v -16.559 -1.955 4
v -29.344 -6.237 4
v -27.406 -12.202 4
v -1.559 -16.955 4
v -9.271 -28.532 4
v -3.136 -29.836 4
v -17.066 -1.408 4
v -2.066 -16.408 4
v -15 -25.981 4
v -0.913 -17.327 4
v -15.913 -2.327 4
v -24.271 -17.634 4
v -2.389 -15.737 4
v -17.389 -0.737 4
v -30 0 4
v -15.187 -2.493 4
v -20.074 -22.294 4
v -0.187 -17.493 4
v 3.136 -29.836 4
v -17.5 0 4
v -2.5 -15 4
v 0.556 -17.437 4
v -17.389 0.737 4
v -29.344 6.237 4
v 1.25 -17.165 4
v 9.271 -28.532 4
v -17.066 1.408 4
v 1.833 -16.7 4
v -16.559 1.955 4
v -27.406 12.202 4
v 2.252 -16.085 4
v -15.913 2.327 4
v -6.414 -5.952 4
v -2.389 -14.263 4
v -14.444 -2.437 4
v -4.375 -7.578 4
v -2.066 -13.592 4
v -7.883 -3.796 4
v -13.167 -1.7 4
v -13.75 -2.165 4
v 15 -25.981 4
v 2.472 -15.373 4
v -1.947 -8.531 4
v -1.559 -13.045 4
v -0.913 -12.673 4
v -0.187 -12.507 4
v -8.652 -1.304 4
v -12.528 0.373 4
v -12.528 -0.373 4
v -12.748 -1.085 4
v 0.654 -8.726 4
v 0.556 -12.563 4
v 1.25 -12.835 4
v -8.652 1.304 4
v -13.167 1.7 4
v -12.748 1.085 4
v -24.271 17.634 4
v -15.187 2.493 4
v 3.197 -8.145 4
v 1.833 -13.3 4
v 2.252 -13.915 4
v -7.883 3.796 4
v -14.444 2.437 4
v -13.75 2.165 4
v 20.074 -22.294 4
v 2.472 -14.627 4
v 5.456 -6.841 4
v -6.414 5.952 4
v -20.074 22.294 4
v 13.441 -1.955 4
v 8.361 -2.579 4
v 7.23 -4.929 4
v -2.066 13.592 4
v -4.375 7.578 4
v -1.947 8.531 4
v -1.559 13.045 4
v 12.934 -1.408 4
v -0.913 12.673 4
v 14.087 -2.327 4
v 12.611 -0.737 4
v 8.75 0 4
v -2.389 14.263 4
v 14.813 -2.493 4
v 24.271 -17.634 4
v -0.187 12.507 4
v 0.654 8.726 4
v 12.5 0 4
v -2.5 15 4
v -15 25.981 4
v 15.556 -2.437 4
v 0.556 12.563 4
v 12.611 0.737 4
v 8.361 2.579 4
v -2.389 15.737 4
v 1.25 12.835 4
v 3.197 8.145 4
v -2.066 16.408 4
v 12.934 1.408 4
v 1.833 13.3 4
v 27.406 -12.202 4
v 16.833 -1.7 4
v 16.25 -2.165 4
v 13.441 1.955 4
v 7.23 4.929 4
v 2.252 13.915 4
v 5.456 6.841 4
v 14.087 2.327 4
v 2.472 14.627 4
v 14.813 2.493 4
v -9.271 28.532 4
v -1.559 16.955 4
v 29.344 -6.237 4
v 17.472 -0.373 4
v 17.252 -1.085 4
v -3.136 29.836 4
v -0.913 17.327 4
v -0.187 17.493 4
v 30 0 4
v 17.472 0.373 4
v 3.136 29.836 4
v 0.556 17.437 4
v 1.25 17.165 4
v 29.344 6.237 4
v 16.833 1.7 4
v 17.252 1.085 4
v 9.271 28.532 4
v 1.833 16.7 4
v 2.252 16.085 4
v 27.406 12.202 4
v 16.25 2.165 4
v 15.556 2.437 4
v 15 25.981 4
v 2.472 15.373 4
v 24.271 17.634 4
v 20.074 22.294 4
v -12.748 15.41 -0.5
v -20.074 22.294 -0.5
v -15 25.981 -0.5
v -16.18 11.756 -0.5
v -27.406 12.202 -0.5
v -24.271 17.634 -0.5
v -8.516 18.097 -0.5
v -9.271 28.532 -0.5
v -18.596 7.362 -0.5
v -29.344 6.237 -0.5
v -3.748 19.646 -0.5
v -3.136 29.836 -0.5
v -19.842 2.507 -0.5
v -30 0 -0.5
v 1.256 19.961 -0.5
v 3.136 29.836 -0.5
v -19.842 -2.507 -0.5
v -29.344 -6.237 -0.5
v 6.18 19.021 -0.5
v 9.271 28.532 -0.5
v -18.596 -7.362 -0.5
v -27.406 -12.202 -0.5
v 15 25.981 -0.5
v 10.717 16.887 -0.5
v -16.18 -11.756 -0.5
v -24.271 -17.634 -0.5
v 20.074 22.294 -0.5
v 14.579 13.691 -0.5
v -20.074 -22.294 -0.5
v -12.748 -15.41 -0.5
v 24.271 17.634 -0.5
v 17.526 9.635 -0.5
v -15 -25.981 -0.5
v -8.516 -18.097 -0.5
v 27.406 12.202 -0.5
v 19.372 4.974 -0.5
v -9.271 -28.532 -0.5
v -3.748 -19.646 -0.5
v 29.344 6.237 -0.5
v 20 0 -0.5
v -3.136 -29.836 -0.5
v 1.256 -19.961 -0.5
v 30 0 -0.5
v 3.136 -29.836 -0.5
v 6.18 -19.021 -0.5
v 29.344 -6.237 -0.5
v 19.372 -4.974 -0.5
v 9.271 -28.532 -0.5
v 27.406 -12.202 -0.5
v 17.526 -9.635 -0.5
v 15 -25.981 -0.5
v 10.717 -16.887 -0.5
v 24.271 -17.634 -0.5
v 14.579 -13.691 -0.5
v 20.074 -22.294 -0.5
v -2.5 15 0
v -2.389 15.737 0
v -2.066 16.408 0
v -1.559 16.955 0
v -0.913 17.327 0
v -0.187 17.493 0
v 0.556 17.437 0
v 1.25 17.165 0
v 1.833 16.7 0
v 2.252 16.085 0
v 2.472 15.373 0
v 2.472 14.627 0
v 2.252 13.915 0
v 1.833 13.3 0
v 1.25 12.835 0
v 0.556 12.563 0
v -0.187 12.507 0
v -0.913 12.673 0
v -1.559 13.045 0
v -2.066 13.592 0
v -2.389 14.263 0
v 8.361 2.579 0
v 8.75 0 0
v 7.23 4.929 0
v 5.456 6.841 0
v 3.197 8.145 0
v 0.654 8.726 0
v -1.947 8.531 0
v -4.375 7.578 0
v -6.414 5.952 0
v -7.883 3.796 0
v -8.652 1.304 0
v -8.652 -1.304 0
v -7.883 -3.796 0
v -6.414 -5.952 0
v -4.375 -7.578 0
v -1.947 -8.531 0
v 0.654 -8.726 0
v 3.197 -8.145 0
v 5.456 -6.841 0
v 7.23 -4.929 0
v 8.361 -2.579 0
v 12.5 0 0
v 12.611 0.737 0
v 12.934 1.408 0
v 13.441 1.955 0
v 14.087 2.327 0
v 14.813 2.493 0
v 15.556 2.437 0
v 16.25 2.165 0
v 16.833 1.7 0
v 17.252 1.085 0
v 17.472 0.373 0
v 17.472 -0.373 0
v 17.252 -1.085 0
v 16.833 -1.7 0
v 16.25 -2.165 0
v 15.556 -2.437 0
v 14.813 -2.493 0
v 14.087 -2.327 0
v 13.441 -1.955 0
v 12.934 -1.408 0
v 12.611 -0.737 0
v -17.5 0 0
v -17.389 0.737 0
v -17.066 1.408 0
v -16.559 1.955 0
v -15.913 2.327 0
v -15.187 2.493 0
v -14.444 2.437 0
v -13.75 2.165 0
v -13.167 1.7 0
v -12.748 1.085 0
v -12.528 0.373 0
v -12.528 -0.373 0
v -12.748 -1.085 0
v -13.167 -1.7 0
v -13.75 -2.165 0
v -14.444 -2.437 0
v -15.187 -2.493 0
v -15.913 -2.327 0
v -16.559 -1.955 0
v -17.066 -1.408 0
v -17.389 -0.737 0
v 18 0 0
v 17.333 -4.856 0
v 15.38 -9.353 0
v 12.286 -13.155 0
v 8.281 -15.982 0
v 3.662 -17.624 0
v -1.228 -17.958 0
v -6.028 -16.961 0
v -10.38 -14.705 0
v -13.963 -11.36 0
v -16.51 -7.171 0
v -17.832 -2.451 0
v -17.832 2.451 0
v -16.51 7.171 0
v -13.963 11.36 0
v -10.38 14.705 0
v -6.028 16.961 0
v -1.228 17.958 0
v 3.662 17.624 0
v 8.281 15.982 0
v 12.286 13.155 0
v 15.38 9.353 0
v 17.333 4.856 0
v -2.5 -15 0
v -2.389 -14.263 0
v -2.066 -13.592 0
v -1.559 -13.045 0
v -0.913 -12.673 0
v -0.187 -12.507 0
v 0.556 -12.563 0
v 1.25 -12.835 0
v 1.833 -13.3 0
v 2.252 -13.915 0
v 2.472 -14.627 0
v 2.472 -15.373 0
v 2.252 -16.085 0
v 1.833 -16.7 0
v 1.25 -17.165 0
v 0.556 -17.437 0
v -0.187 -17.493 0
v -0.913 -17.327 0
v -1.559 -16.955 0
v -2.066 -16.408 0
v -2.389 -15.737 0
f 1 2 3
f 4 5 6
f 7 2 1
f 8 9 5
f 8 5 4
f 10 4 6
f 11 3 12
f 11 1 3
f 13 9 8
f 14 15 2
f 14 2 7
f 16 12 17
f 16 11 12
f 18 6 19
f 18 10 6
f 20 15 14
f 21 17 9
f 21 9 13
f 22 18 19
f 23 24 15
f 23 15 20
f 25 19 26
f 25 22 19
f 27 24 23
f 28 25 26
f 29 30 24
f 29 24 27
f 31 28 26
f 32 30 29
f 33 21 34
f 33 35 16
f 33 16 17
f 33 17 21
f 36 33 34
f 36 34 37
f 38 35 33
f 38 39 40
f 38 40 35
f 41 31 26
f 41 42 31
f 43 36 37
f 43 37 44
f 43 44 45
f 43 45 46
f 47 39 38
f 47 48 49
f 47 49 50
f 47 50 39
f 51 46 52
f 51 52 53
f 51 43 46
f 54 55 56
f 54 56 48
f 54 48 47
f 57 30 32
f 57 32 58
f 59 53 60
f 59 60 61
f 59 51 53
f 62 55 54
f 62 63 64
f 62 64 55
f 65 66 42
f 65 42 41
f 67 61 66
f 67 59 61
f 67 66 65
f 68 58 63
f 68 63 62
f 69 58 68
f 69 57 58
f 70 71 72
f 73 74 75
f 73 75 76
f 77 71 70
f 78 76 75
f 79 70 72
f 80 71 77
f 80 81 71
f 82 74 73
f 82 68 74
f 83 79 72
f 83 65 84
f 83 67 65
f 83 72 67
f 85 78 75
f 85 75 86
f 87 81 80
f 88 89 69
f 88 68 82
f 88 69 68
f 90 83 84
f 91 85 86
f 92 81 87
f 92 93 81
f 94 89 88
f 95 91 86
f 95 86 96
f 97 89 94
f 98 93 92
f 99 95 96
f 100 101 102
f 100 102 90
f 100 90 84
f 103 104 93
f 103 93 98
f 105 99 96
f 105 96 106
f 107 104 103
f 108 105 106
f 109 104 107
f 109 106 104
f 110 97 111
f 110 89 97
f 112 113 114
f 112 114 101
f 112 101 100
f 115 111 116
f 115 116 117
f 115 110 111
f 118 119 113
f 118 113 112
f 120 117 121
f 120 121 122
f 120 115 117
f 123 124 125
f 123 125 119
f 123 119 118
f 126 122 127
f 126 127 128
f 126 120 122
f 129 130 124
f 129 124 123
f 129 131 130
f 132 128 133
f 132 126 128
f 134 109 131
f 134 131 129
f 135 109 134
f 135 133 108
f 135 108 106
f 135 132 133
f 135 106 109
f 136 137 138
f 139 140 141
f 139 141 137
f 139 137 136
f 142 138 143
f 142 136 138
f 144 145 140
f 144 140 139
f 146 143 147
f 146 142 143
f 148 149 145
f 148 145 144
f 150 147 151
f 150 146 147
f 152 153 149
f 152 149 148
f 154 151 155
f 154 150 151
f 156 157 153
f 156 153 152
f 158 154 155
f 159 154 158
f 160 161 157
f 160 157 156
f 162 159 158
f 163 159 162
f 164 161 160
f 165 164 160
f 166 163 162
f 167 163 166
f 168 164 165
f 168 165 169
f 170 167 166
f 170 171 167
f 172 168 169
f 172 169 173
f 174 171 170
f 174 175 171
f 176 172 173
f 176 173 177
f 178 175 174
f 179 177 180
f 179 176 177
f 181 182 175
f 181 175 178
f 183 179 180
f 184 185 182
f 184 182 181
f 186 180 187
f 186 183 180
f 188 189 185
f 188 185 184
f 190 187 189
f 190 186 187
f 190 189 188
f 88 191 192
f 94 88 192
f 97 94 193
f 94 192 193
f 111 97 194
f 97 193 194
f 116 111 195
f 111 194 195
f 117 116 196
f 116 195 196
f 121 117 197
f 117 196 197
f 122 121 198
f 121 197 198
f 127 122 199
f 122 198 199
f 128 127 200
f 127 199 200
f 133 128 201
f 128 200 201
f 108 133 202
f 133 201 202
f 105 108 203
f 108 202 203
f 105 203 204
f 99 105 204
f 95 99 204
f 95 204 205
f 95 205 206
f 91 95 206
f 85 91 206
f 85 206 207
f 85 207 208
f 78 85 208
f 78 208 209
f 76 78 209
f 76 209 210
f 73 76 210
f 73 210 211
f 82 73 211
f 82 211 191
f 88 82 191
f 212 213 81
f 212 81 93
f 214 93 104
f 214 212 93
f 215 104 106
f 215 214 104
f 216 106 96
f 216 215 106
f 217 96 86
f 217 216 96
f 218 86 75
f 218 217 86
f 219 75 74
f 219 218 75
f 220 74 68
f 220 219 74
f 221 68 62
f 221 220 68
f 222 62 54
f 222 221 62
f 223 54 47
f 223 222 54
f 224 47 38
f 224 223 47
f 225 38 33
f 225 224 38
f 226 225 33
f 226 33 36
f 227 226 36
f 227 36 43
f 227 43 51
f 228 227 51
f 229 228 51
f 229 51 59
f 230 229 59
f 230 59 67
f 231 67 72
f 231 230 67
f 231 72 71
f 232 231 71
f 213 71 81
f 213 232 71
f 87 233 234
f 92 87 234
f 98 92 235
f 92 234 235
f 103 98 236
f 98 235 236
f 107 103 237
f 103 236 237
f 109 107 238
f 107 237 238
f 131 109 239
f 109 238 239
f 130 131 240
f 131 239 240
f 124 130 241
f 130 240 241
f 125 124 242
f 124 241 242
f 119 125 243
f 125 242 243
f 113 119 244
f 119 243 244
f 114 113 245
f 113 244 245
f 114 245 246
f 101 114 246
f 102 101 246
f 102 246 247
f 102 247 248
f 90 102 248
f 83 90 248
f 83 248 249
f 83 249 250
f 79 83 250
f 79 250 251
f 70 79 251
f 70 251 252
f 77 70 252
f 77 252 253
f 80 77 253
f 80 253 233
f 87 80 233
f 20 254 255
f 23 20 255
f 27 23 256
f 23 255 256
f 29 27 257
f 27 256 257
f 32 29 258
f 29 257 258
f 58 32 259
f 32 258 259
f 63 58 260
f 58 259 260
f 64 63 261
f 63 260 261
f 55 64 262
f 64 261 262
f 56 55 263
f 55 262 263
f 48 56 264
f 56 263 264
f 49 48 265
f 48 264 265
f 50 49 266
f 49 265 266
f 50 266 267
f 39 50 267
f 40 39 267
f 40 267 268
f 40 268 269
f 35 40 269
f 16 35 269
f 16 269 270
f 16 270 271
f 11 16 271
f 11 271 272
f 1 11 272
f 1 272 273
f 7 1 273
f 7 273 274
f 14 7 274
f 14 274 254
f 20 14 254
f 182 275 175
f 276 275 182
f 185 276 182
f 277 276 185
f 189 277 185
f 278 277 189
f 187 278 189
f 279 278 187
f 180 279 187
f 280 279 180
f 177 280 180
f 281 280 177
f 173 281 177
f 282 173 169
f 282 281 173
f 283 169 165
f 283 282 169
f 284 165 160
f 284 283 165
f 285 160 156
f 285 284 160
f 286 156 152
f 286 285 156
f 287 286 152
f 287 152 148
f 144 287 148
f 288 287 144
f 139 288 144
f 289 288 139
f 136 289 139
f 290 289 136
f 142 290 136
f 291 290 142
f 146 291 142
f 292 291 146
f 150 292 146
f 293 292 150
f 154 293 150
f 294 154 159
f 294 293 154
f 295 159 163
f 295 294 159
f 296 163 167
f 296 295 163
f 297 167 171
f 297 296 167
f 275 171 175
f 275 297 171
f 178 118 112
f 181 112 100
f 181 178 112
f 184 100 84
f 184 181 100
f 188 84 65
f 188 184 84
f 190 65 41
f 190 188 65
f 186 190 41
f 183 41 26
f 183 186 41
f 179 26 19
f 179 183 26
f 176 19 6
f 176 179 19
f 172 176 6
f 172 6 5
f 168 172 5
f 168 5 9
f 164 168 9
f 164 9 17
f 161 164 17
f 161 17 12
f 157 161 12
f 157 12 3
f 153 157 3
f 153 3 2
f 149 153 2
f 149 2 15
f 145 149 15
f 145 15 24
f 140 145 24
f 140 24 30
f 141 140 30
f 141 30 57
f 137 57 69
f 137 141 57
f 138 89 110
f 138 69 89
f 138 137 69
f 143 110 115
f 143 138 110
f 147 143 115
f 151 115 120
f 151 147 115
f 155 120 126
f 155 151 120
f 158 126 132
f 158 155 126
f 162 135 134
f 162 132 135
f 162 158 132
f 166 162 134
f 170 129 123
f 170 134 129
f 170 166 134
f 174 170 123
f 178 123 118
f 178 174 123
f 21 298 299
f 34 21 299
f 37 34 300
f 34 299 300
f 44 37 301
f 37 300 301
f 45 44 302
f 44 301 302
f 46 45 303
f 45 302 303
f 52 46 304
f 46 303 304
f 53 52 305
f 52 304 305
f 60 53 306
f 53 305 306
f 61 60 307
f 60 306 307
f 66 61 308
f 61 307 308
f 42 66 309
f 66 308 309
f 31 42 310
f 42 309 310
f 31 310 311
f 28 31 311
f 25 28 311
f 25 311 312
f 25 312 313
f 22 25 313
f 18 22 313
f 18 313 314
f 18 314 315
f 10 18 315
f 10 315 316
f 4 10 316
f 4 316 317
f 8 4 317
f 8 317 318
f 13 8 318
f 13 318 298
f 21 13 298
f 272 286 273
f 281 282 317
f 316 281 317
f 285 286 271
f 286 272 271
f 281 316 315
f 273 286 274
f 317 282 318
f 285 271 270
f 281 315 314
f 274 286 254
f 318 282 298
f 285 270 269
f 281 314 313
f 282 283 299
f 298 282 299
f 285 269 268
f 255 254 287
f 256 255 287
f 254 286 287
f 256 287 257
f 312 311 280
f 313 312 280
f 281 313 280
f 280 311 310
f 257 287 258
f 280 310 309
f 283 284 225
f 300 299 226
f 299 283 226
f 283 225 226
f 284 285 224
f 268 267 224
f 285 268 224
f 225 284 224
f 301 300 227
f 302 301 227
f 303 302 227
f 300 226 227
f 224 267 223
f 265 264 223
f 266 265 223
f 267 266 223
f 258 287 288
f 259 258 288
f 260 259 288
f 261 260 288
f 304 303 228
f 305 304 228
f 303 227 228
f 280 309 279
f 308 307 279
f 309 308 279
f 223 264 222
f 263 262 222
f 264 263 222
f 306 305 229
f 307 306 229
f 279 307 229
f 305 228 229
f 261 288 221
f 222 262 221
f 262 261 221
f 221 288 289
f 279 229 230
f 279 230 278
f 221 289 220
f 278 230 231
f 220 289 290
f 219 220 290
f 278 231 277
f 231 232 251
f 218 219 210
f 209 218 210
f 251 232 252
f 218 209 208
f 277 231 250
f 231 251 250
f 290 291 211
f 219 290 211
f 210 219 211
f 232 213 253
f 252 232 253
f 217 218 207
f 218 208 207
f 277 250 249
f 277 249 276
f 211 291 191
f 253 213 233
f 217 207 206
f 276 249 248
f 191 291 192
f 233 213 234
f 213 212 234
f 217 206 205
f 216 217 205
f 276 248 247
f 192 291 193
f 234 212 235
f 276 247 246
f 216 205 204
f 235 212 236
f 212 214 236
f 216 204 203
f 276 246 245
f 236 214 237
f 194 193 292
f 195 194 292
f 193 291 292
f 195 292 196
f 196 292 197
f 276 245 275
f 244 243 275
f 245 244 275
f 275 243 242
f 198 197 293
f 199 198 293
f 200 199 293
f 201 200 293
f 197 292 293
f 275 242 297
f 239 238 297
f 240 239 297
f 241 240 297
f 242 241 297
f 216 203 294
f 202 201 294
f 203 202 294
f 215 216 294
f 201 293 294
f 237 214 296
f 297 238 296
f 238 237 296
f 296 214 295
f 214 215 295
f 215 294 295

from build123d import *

# Parameters (mm, degrees)
SKETCH_1_R         = 30
SKETCH_1_R_2       = 8.75
EXTRUDE_1_DEPTH    = 4
HOLE_WIZARD_M6_1_D = 5


with BuildPart() as part:
    # 草图1 → 凸台-拉伸1 (new body)
    with BuildSketch(Plane.XY):
        Circle(SKETCH_1_R)
        Circle(SKETCH_1_R_2, mode=Mode.SUBTRACT)
    extrude(amount=EXTRUDE_1_DEPTH)

    # 草图4 → 旋转1 (revolve)
    with BuildSketch(Plane(origin=(0, 0, 0), x_dir=(1, 0, 0), z_dir=(0, 1, 0)), mode=Mode.PRIVATE) as revolve_1_sk:
        Polygon((-30, 0), (-30, 0.5), (-20, 0.5), (-18, 0), align=None)
    revolve(revolve_1_sk.sketch.rotate(Axis((0, 0, 0), (0, 0, -1)), 180), axis=Axis((0, 0, 0), (0, 0, -1)))

    # M6 螺纹孔1 (through all)
    with Locations(Plane.XY.offset(4)):
        with Locations((0, 15), (15, 0), (0, -15), (-15, 0)):
            Hole(HOLE_WIZARD_M6_1_D / 2)


solid = part.part
